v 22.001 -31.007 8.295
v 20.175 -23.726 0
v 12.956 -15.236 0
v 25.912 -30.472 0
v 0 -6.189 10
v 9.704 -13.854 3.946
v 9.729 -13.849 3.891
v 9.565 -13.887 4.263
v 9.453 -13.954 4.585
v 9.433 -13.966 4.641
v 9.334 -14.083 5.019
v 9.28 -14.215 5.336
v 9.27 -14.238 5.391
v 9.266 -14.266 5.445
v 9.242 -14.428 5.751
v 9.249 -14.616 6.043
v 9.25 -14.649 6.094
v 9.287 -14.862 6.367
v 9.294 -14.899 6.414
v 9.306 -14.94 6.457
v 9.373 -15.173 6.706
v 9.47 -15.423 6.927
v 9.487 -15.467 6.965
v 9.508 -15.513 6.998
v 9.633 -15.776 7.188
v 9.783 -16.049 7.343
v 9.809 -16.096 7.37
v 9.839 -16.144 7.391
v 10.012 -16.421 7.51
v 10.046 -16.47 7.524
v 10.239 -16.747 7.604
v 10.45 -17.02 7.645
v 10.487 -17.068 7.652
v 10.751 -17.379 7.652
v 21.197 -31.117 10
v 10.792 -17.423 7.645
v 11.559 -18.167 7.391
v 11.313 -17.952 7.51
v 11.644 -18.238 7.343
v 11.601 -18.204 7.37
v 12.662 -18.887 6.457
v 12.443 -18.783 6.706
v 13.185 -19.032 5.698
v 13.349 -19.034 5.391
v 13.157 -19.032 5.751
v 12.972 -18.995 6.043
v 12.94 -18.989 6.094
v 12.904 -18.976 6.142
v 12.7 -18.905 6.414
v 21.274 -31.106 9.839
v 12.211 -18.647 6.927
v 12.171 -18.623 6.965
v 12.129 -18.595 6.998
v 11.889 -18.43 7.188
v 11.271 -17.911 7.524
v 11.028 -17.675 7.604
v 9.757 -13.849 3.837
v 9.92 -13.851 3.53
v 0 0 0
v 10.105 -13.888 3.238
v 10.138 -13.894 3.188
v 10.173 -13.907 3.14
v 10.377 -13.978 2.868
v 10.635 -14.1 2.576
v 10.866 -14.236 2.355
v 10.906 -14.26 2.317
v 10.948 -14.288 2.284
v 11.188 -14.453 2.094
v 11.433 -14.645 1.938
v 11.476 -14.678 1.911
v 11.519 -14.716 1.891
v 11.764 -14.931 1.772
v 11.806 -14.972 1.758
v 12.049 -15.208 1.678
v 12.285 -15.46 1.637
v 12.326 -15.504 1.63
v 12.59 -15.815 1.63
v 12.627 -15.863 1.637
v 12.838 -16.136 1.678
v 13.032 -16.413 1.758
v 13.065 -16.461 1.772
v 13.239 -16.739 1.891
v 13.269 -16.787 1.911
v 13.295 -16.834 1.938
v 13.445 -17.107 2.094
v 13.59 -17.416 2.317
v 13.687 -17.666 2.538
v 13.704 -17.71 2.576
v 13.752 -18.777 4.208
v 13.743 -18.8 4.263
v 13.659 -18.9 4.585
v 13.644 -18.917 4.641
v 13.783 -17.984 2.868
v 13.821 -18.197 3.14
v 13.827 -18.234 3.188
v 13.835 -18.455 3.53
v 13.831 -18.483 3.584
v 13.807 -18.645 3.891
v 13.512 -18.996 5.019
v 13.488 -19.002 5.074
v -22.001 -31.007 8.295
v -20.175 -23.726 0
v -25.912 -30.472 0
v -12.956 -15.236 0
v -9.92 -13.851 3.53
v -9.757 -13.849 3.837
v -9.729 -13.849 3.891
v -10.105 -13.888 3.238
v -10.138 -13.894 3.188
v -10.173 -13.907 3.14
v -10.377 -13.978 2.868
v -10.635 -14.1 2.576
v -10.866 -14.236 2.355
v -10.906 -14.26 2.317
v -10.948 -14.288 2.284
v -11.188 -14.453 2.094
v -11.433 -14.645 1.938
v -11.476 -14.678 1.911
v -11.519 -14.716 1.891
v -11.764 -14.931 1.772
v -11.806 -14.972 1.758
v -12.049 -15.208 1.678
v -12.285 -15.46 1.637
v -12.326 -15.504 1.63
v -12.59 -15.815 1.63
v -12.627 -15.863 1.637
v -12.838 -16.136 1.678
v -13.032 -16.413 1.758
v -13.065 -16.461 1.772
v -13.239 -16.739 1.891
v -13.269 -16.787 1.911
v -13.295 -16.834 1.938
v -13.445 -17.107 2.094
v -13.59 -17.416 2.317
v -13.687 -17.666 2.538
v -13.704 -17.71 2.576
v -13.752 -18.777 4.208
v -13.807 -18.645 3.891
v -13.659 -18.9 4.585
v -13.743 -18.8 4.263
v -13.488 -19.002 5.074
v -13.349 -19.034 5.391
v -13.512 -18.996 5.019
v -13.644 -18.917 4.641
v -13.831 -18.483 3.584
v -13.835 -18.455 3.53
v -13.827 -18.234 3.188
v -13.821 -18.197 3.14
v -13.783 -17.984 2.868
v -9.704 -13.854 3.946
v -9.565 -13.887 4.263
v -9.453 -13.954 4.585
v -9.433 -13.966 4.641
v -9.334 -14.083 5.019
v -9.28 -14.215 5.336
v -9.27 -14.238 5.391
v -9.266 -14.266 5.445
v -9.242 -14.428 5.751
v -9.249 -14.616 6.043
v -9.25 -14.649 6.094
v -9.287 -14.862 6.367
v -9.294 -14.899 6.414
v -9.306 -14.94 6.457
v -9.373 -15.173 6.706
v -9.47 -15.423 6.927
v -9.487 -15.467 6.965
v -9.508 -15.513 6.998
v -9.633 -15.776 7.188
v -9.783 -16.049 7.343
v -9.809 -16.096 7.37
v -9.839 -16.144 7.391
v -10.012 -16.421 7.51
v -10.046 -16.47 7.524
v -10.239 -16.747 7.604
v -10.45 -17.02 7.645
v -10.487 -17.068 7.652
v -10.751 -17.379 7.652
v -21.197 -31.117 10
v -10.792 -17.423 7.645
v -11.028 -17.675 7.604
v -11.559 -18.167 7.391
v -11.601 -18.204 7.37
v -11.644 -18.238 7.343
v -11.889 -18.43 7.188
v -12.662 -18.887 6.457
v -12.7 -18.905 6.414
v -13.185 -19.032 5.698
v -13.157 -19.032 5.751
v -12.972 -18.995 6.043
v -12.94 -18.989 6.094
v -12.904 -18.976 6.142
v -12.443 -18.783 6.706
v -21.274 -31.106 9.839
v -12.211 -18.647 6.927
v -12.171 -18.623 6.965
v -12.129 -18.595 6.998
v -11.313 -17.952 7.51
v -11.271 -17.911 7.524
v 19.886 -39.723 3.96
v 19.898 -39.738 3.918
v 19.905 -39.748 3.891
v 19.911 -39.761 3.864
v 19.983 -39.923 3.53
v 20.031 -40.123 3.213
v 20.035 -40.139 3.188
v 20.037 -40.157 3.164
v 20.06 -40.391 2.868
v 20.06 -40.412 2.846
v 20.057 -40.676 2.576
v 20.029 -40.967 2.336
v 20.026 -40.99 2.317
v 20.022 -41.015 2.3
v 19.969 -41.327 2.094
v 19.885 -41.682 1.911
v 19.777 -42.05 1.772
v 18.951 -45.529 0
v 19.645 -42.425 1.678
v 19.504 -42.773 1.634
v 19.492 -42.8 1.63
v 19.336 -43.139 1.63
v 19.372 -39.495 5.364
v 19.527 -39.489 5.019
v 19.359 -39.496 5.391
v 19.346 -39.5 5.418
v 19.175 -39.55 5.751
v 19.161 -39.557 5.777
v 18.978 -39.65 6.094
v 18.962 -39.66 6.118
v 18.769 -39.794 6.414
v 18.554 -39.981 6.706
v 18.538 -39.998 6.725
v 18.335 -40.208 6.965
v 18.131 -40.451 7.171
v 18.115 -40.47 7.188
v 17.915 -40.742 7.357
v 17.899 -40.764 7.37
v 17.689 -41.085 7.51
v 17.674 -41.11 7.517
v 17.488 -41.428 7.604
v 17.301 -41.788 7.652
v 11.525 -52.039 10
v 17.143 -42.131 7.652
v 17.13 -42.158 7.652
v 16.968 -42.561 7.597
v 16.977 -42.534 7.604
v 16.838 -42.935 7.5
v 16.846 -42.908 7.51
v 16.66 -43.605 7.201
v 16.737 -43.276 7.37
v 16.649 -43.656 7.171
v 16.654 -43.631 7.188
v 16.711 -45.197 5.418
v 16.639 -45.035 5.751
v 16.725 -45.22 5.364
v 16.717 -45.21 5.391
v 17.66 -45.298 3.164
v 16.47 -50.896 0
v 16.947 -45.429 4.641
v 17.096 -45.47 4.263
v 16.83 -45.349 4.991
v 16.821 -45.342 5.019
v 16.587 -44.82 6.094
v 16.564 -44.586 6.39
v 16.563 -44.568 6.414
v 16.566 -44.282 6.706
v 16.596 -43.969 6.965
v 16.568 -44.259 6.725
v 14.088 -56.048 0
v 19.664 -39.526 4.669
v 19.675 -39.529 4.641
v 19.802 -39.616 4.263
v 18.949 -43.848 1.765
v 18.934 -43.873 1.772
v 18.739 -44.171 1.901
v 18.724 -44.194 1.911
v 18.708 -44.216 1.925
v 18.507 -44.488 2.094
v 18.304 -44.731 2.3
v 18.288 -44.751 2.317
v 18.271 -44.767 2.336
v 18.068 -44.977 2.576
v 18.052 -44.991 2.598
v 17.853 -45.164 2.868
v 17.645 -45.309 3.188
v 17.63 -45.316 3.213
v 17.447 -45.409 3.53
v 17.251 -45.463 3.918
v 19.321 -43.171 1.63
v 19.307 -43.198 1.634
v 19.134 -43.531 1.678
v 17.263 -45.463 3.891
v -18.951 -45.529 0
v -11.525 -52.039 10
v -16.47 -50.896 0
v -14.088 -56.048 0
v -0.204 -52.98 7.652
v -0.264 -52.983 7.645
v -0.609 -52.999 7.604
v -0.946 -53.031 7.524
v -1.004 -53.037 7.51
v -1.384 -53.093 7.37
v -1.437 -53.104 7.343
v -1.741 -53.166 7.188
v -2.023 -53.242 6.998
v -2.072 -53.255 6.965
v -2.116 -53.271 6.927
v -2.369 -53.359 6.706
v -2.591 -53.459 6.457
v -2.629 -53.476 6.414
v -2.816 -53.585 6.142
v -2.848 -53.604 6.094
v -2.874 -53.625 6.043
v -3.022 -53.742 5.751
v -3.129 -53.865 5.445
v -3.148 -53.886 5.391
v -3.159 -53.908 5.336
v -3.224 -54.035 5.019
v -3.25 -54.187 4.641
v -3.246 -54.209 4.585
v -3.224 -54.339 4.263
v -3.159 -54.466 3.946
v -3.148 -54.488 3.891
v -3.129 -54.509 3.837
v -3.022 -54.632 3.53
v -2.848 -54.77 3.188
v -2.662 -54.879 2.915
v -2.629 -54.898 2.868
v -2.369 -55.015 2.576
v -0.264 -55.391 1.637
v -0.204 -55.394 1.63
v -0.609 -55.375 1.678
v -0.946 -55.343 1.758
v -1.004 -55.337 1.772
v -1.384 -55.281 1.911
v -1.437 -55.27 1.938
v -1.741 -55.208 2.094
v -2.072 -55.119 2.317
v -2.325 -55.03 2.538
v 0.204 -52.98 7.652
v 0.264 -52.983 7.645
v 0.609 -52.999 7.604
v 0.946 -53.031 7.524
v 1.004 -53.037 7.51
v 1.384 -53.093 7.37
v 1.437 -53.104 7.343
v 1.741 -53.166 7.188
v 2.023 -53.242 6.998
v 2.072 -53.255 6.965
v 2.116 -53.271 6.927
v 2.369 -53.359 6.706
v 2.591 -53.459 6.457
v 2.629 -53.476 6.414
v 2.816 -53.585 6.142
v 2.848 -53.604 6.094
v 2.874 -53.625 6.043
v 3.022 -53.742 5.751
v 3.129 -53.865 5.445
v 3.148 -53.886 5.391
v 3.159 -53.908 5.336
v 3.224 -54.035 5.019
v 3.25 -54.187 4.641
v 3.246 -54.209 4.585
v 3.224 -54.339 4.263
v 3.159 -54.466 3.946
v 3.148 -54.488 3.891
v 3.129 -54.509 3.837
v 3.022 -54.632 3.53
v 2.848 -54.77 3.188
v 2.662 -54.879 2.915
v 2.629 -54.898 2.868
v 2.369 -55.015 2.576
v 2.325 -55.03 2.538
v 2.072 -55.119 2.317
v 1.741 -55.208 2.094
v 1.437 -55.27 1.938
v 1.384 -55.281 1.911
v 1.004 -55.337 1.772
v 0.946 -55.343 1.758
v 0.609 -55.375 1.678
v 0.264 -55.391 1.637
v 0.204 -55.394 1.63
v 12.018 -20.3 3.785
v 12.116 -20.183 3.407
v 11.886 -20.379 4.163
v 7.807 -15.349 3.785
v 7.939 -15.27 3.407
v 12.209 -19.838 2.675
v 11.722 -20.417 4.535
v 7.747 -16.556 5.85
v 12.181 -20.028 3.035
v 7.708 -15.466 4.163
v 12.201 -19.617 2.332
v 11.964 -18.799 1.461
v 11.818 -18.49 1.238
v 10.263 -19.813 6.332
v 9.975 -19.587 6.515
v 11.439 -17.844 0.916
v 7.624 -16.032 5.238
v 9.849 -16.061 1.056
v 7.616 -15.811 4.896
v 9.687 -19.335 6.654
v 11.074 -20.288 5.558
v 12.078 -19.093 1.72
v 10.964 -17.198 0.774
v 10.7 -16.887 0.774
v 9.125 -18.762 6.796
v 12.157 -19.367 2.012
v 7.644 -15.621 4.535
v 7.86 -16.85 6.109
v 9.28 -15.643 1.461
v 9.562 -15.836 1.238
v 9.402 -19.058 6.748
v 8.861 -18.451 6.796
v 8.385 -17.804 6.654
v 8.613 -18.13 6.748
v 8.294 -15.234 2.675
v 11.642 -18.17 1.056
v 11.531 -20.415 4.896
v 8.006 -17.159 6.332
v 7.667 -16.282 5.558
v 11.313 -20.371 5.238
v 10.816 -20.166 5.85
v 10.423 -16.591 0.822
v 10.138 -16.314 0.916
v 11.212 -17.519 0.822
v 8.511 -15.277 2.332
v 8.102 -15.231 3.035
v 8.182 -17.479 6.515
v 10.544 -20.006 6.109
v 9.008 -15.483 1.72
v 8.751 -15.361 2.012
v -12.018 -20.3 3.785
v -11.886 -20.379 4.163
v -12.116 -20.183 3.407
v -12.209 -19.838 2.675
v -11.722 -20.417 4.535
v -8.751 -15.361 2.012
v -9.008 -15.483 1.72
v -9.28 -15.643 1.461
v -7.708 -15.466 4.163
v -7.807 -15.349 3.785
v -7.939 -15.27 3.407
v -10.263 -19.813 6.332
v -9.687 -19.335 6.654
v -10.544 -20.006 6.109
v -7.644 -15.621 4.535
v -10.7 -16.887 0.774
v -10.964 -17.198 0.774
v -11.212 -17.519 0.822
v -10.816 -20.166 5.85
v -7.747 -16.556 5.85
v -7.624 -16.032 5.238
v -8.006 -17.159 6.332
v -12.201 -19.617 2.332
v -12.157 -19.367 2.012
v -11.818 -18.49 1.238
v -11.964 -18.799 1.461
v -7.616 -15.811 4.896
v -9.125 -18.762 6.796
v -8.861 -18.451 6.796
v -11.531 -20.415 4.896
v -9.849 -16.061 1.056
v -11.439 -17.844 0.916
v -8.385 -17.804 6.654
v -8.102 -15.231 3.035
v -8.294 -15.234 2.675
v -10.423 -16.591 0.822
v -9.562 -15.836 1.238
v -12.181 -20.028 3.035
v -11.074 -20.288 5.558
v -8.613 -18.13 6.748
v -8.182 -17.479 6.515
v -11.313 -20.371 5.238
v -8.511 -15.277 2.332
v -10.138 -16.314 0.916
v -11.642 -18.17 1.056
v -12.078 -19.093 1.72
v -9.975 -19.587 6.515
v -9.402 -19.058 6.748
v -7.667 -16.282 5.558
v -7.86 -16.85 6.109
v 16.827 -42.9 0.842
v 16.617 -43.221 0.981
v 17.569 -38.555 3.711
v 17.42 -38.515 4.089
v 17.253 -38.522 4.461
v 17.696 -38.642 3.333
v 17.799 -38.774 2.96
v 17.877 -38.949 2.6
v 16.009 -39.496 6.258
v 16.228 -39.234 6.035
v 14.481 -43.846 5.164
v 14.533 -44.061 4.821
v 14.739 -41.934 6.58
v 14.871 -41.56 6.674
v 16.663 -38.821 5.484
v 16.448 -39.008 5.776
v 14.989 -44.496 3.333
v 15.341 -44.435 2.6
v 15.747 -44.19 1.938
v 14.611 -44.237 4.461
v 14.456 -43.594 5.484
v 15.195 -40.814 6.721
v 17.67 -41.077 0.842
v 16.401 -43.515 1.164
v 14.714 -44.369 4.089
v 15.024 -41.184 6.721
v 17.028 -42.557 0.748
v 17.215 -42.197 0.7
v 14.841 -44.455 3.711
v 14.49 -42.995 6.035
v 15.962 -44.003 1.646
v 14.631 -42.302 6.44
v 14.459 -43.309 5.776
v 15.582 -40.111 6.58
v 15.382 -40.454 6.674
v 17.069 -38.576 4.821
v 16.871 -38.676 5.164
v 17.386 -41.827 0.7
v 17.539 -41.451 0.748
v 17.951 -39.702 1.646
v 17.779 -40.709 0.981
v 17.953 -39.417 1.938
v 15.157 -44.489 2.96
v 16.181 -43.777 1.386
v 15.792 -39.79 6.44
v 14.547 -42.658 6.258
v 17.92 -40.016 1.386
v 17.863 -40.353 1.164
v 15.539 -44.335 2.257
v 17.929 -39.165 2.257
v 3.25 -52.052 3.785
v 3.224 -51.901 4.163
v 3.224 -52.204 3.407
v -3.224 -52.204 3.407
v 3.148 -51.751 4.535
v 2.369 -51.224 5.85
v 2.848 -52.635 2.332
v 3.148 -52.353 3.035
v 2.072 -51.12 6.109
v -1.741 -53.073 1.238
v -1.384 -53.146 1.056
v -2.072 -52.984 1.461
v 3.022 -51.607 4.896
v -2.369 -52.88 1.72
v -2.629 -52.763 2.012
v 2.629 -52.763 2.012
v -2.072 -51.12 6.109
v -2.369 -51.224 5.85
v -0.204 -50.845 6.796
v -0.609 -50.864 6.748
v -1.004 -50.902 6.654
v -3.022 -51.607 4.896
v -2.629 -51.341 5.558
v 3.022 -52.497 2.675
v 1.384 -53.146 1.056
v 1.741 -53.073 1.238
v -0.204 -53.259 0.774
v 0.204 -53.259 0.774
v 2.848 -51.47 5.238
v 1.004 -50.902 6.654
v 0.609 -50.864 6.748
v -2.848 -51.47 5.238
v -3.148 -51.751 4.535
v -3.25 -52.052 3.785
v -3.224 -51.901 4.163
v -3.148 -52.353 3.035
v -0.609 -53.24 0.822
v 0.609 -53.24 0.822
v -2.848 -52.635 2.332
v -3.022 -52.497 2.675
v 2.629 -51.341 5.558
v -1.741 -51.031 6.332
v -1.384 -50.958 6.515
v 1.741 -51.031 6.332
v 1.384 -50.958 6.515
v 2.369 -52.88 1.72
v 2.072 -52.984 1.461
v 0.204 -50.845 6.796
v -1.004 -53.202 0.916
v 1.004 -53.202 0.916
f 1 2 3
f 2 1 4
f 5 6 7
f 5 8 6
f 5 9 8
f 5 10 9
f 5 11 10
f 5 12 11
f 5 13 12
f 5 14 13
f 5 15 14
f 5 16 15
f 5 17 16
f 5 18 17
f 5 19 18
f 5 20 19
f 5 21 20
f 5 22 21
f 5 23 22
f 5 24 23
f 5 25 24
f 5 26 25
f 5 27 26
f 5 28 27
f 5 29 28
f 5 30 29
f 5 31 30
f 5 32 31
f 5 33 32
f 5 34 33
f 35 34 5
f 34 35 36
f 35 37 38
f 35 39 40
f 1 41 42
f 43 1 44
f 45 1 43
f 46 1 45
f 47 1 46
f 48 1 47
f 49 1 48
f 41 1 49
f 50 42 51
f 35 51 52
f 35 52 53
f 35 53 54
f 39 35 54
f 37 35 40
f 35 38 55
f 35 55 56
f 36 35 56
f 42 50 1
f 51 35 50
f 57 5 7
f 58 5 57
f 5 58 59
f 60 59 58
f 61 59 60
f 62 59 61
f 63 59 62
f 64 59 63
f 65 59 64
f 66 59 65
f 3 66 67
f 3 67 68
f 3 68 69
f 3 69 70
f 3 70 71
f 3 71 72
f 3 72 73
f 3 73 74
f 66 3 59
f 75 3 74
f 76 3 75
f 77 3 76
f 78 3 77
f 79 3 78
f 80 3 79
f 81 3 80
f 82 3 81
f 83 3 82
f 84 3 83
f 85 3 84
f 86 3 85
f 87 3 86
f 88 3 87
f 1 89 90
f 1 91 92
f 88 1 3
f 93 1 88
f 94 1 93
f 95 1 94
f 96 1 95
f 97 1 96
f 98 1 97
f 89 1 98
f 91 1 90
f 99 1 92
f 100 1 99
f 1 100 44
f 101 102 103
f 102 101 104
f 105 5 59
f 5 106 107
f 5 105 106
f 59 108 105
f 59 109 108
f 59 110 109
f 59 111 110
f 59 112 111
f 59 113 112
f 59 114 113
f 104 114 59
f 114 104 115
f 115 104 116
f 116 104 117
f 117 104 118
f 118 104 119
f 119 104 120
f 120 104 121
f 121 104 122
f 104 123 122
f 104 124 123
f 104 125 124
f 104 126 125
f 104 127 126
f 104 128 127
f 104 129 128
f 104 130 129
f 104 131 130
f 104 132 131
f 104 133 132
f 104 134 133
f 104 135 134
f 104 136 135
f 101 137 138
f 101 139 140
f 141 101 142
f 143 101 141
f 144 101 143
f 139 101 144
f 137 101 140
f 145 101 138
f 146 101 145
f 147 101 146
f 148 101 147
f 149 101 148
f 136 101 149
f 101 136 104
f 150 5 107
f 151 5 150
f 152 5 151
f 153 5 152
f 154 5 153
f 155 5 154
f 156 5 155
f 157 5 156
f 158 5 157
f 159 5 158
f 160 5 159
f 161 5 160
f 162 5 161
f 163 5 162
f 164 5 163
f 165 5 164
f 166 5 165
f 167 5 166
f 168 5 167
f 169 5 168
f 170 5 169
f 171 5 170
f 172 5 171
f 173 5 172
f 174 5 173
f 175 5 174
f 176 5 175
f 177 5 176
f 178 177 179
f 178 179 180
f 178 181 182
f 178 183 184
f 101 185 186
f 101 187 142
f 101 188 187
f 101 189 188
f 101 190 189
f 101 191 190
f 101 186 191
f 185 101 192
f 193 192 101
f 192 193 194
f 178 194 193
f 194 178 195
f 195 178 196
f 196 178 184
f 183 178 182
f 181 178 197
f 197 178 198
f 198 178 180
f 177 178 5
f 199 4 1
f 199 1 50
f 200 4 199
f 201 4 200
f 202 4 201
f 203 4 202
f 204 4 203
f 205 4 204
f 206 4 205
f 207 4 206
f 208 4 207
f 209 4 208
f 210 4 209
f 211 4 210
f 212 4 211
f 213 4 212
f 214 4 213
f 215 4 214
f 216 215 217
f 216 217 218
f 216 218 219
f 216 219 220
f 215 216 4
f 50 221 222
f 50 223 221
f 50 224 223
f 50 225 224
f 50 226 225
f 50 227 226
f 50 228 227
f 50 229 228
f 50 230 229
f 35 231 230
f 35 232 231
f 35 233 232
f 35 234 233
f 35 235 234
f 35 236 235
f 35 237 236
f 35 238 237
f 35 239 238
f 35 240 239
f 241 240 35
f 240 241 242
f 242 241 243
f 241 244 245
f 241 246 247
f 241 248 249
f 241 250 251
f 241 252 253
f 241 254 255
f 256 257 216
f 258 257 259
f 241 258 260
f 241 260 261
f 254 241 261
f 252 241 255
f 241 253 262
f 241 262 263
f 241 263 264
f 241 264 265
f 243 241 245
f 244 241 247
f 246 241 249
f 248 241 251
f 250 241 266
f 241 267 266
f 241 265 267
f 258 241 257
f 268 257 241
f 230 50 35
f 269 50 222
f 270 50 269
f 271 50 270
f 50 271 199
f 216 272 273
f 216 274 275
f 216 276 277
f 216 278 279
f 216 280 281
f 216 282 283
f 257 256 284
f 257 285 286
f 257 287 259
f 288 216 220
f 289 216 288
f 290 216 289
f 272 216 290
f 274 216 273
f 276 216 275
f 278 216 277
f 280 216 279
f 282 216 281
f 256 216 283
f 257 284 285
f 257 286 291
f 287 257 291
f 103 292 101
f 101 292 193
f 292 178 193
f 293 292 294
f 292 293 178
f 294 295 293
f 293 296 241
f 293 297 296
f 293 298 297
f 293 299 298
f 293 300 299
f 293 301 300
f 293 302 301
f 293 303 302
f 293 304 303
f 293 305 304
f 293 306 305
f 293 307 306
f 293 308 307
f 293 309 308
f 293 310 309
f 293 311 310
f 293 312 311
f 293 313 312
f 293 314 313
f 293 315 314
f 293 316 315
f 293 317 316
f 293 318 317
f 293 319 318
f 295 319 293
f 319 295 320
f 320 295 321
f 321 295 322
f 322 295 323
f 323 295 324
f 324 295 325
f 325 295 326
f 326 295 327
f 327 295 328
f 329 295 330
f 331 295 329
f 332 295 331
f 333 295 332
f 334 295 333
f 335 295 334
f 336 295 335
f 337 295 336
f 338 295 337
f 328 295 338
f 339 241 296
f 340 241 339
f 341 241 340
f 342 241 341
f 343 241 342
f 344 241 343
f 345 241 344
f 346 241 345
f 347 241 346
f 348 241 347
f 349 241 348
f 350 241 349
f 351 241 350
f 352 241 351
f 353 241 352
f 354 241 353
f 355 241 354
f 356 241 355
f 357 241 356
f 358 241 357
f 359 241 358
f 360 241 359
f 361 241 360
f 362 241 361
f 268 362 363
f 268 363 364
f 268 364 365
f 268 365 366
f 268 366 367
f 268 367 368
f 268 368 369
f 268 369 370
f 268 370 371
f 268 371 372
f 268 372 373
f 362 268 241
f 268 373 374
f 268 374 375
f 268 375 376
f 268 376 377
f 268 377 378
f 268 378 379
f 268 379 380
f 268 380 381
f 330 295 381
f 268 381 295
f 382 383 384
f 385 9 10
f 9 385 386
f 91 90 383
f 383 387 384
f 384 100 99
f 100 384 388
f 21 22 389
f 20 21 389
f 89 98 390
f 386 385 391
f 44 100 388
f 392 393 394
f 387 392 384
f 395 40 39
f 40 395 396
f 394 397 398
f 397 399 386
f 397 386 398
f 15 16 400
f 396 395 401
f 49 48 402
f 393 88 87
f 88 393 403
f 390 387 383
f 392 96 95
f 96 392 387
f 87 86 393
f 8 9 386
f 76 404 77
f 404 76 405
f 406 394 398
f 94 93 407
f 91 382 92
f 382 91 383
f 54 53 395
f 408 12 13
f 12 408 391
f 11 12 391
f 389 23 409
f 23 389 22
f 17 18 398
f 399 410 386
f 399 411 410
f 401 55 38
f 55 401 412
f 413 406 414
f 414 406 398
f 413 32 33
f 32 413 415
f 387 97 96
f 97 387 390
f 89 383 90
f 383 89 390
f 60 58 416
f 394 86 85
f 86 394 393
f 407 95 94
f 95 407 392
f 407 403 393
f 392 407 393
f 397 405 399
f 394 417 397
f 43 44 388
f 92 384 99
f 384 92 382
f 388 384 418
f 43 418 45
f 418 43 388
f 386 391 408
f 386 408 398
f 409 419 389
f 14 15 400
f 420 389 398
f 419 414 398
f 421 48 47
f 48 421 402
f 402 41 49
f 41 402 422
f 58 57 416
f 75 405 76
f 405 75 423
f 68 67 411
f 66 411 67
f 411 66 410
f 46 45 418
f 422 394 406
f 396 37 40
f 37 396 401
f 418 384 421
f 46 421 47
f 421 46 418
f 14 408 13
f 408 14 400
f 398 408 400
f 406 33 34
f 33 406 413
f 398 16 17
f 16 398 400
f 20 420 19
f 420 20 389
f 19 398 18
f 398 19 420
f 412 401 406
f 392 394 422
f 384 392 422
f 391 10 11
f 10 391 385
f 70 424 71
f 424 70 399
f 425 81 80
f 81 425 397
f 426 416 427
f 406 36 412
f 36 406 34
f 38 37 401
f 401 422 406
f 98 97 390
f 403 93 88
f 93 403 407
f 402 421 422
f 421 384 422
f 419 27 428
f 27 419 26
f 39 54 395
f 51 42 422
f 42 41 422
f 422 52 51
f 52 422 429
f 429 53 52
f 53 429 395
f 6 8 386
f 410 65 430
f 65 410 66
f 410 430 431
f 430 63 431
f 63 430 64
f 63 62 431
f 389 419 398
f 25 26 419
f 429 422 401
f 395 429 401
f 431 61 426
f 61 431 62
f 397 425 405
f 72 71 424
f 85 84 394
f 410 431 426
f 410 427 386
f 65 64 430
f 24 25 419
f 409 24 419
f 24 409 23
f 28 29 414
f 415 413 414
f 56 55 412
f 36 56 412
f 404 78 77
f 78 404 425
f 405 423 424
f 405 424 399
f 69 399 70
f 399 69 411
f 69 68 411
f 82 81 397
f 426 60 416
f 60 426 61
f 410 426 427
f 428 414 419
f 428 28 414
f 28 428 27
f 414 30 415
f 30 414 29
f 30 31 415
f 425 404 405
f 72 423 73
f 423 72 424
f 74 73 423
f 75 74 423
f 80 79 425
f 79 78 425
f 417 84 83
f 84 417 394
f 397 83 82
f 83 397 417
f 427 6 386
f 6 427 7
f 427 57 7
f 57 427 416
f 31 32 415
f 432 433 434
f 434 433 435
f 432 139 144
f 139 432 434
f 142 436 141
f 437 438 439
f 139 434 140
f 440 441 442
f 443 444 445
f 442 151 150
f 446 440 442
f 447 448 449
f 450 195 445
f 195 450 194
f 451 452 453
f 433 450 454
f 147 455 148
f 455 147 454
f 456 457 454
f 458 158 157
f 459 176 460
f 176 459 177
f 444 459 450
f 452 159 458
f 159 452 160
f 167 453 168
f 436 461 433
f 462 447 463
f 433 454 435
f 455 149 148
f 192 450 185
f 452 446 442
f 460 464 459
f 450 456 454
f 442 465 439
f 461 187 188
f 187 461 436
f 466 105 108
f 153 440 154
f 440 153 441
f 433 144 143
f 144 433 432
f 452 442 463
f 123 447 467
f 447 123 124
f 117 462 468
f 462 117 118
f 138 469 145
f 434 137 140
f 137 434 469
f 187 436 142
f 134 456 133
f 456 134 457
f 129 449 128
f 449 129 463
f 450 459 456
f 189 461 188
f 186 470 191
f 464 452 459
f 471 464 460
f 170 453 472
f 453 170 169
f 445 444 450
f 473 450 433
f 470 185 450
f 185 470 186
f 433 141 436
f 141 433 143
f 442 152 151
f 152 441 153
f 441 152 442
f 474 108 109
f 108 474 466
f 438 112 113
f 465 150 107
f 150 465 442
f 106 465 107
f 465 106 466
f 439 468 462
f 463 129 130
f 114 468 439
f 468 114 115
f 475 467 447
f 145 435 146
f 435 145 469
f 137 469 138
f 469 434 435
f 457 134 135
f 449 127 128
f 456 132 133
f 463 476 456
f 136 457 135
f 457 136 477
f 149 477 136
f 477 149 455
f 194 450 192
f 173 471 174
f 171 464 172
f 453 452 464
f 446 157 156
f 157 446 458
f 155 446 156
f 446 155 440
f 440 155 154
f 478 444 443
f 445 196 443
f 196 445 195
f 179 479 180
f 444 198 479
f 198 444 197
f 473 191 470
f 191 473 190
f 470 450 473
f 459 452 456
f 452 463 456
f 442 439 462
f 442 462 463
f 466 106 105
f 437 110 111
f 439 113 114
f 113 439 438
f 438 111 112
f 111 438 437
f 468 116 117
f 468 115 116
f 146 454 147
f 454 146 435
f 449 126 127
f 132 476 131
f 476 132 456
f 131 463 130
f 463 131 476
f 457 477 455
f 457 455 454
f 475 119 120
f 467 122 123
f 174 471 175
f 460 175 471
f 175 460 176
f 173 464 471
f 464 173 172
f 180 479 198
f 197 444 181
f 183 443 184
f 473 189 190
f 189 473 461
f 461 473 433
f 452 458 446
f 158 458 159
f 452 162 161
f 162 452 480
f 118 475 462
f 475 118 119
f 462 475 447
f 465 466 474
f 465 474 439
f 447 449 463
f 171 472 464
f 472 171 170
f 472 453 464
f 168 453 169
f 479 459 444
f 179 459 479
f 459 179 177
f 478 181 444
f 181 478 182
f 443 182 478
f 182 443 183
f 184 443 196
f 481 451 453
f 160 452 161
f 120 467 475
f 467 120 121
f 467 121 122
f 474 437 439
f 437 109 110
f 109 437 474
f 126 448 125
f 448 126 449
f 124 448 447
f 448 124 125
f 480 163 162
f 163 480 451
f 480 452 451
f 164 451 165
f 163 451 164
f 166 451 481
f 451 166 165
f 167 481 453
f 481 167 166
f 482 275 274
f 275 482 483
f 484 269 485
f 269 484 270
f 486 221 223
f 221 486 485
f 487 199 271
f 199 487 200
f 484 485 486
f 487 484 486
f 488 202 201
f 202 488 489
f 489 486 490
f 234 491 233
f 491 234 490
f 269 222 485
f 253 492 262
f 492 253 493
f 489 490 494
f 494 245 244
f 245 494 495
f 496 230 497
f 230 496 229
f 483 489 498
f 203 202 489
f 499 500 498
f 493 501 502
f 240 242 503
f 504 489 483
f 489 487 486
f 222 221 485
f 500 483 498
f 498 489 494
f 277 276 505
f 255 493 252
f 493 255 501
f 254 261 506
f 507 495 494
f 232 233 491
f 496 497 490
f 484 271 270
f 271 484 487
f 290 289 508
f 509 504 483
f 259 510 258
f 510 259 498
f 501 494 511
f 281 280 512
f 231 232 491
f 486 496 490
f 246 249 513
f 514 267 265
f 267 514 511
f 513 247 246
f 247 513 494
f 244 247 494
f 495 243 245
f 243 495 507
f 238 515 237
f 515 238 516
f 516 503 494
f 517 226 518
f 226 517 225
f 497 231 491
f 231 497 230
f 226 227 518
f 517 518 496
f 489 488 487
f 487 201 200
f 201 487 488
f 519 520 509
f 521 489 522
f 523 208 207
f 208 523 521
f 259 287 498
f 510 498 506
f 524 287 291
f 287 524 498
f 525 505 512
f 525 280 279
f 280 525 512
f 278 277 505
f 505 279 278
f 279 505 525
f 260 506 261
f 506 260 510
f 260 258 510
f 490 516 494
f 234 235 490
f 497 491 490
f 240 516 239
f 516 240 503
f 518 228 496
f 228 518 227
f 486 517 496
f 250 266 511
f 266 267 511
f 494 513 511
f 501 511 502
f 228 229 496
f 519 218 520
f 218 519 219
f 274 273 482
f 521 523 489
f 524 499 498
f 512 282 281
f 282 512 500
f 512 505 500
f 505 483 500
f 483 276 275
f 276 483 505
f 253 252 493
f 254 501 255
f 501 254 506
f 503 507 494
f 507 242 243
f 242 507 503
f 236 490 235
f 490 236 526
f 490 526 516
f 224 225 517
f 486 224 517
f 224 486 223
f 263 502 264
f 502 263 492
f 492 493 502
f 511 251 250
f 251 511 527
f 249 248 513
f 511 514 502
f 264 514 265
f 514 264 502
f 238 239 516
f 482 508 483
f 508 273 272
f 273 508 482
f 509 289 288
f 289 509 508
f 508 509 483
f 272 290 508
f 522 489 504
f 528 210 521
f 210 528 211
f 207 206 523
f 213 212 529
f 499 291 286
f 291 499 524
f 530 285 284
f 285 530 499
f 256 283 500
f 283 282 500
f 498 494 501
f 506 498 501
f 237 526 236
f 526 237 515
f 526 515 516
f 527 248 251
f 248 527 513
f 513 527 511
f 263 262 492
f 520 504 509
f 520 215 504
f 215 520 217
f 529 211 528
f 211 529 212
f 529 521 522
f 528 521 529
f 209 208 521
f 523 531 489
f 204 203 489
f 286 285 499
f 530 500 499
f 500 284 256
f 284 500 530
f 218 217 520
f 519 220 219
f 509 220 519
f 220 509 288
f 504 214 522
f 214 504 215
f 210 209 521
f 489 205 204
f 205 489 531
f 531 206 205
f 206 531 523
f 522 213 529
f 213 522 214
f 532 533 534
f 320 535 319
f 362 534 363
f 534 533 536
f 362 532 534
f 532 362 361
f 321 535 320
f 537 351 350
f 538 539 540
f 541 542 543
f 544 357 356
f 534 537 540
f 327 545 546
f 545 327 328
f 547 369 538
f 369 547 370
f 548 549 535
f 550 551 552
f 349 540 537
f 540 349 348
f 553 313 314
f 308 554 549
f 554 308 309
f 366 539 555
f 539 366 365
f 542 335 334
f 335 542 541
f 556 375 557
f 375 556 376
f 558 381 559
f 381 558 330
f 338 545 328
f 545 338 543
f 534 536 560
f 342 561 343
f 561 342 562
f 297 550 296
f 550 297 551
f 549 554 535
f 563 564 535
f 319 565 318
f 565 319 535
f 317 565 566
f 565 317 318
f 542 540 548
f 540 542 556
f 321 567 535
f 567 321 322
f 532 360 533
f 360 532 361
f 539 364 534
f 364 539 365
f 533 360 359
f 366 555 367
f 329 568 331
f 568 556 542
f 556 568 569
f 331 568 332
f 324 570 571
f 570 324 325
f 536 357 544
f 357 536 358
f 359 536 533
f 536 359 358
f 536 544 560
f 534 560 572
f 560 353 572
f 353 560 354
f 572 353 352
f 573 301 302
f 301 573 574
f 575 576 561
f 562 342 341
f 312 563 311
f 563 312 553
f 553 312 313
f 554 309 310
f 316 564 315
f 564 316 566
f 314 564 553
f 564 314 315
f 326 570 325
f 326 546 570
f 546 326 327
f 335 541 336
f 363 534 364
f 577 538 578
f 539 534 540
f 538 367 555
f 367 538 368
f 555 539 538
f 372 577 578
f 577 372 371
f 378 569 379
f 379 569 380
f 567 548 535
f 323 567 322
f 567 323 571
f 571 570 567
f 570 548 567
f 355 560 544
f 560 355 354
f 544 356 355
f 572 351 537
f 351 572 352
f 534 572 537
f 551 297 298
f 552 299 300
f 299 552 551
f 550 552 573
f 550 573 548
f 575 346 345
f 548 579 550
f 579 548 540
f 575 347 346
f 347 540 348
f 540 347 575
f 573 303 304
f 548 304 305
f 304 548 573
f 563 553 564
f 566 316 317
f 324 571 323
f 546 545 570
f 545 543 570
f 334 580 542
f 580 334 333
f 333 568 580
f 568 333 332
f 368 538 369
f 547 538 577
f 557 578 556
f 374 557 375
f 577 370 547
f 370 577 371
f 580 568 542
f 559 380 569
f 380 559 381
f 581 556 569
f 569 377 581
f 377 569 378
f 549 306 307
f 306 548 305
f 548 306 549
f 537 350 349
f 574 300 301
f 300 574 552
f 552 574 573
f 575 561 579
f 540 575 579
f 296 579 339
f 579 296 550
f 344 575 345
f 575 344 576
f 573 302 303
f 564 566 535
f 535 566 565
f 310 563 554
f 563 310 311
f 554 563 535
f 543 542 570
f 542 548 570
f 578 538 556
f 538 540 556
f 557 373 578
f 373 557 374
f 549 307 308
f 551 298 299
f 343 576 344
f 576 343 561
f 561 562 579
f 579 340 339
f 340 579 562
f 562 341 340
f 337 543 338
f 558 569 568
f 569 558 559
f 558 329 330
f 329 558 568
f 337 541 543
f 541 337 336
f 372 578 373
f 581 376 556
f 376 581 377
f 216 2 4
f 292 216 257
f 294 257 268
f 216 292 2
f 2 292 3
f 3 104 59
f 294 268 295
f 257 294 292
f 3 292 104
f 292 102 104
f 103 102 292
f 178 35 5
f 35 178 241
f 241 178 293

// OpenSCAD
//Pentagonal icositetrahedron with magnets

//Dihedral angle: 136.3092°
//big angle (times 4), 114.812°, smallangle x1 80.7517°
$fn=50;

//to do put in my diagram

longside = 40; //long side -- this is the only parameter needed to define our pentagon
thickness = 10; //how thick our piece is

magnetdepth = 2.5;
magnetdiam = 6.5;

dihedral = 136.3092; //the dihedral angle of our thing is fixed
alpha = 80.7517; //the small angle of the point
beta = 114.812; //the larger angle between the other points


b = sin(alpha/2)*longside;
a = cos(alpha/2)*longside;

gamma = asin(a/longside);

shortside = 2*b/(1+2*cos(beta-gamma));

c = sin(beta-gamma)*shortside;

d = thickness/tan(dihedral/2);

e = sin(180-beta)*thickness;
f = sqrt(thickness*thickness-e*e);

excess = 15;

module mainbody(){
linear_extrude(height = thickness ) {
polygon([[0,0],[+b,-a],[shortside/2,-a-c],[-shortside/2,-a-c],[-b,-a]]);
}}

module chamfers() {
rotate([(180-dihedral)/2,0,-90+alpha/2]){
linear_extrude(center=true, height=25) {
polygon([[-5,0],[-5,thickness],[longside+5,thickness],[longside+5,0]]);
}}

mirror([1,0,0]){
rotate([(180-dihedral)/2,0,-90+alpha/2]){
linear_extrude(center=true, height=25) {
polygon([[-5,0],[-5,thickness],[longside+5,thickness],[longside+5,0]]);
}}}

translate([(shortside/2),-a-c,0]){
rotate([(-180+dihedral)/2,0,180-beta]){
translate([0,-thickness,0]){
linear_extrude(center=true, height=25) {
polygon([[-5,0],[-5,thickness],[shortside,thickness],[shortside,0]]);
}}}}

mirror([1,0,0]){
translate([(shortside/2),-a-c,0]){
rotate([(-180+dihedral)/2,0,180-beta]){
translate([0,-thickness,0]){
linear_extrude(center=true, height=25) {
polygon([[-5,0],[-5,thickness],[shortside,thickness],[shortside,0]]);
}}}}}


translate([0,-a-c,0]){
rotate([(-180+dihedral)/2,0,0]){
linear_extrude(center=true, height=25) {
polygon([[-shortside/2,-thickness],[shortside/2,-thickness],[shortside/2,0],[-shortside/2,0]]);
}}}

}

module magnets() {

//MAGNETS
rotate([-dihedral/2,0,-90+alpha/2]){
translate([longside/2,-thickness/2,-magnetdepth+0.2]){
linear_extrude(center=false, height=magnetdepth+0.2) {
circle(magnetdiam/2);
}}}



mirror([1,0,0]){
rotate([-dihedral/2,0,-90+alpha/2]){
translate([longside/2,-thickness/2,-magnetdepth+0.2]){
linear_extrude(center=false, height=magnetdepth+0.2) {
circle(magnetdiam/2);
}}}}


translate([(shortside/2),-a-c,0]){
rotate([(-180+dihedral)/2,0,180-beta]){
rotate([-90,0,0]){//90-dihedral
translate([shortside/2,-thickness/2,-.2]){
linear_extrude(center=false, height=magnetdepth+0.2) {
circle(magnetdiam/2);
}}}
}}

/*mirror([1,0,0]){
translate([(shortside/2),-a-c,0]){
rotate([(-180+dihedral)/2,0,180-beta]){
rotate([-90,0,0]){//90-dihedral
translate([shortside/2,-thickness/2,-.2]){
linear_extrude(center=false, height=magnetdepth+0.2) {
circle(magnetdiam/2);
}}}
}}}*/ //this magnet removed, or replace it and remove the other for the other enantiomorph

translate([0,-a-c,0]){
rotate([(-180+dihedral)/2,0,0]){
translate([0,magnetdepth-.2,thickness/2]){
rotate([90,0,0]){
linear_extrude(center=false, height=magnetdepth+0.2) {
circle(magnetdiam/2);
}}}
}}

}


difference(){
	mainbody();
		union(){
		chamfers();
		magnets();
	}
}
